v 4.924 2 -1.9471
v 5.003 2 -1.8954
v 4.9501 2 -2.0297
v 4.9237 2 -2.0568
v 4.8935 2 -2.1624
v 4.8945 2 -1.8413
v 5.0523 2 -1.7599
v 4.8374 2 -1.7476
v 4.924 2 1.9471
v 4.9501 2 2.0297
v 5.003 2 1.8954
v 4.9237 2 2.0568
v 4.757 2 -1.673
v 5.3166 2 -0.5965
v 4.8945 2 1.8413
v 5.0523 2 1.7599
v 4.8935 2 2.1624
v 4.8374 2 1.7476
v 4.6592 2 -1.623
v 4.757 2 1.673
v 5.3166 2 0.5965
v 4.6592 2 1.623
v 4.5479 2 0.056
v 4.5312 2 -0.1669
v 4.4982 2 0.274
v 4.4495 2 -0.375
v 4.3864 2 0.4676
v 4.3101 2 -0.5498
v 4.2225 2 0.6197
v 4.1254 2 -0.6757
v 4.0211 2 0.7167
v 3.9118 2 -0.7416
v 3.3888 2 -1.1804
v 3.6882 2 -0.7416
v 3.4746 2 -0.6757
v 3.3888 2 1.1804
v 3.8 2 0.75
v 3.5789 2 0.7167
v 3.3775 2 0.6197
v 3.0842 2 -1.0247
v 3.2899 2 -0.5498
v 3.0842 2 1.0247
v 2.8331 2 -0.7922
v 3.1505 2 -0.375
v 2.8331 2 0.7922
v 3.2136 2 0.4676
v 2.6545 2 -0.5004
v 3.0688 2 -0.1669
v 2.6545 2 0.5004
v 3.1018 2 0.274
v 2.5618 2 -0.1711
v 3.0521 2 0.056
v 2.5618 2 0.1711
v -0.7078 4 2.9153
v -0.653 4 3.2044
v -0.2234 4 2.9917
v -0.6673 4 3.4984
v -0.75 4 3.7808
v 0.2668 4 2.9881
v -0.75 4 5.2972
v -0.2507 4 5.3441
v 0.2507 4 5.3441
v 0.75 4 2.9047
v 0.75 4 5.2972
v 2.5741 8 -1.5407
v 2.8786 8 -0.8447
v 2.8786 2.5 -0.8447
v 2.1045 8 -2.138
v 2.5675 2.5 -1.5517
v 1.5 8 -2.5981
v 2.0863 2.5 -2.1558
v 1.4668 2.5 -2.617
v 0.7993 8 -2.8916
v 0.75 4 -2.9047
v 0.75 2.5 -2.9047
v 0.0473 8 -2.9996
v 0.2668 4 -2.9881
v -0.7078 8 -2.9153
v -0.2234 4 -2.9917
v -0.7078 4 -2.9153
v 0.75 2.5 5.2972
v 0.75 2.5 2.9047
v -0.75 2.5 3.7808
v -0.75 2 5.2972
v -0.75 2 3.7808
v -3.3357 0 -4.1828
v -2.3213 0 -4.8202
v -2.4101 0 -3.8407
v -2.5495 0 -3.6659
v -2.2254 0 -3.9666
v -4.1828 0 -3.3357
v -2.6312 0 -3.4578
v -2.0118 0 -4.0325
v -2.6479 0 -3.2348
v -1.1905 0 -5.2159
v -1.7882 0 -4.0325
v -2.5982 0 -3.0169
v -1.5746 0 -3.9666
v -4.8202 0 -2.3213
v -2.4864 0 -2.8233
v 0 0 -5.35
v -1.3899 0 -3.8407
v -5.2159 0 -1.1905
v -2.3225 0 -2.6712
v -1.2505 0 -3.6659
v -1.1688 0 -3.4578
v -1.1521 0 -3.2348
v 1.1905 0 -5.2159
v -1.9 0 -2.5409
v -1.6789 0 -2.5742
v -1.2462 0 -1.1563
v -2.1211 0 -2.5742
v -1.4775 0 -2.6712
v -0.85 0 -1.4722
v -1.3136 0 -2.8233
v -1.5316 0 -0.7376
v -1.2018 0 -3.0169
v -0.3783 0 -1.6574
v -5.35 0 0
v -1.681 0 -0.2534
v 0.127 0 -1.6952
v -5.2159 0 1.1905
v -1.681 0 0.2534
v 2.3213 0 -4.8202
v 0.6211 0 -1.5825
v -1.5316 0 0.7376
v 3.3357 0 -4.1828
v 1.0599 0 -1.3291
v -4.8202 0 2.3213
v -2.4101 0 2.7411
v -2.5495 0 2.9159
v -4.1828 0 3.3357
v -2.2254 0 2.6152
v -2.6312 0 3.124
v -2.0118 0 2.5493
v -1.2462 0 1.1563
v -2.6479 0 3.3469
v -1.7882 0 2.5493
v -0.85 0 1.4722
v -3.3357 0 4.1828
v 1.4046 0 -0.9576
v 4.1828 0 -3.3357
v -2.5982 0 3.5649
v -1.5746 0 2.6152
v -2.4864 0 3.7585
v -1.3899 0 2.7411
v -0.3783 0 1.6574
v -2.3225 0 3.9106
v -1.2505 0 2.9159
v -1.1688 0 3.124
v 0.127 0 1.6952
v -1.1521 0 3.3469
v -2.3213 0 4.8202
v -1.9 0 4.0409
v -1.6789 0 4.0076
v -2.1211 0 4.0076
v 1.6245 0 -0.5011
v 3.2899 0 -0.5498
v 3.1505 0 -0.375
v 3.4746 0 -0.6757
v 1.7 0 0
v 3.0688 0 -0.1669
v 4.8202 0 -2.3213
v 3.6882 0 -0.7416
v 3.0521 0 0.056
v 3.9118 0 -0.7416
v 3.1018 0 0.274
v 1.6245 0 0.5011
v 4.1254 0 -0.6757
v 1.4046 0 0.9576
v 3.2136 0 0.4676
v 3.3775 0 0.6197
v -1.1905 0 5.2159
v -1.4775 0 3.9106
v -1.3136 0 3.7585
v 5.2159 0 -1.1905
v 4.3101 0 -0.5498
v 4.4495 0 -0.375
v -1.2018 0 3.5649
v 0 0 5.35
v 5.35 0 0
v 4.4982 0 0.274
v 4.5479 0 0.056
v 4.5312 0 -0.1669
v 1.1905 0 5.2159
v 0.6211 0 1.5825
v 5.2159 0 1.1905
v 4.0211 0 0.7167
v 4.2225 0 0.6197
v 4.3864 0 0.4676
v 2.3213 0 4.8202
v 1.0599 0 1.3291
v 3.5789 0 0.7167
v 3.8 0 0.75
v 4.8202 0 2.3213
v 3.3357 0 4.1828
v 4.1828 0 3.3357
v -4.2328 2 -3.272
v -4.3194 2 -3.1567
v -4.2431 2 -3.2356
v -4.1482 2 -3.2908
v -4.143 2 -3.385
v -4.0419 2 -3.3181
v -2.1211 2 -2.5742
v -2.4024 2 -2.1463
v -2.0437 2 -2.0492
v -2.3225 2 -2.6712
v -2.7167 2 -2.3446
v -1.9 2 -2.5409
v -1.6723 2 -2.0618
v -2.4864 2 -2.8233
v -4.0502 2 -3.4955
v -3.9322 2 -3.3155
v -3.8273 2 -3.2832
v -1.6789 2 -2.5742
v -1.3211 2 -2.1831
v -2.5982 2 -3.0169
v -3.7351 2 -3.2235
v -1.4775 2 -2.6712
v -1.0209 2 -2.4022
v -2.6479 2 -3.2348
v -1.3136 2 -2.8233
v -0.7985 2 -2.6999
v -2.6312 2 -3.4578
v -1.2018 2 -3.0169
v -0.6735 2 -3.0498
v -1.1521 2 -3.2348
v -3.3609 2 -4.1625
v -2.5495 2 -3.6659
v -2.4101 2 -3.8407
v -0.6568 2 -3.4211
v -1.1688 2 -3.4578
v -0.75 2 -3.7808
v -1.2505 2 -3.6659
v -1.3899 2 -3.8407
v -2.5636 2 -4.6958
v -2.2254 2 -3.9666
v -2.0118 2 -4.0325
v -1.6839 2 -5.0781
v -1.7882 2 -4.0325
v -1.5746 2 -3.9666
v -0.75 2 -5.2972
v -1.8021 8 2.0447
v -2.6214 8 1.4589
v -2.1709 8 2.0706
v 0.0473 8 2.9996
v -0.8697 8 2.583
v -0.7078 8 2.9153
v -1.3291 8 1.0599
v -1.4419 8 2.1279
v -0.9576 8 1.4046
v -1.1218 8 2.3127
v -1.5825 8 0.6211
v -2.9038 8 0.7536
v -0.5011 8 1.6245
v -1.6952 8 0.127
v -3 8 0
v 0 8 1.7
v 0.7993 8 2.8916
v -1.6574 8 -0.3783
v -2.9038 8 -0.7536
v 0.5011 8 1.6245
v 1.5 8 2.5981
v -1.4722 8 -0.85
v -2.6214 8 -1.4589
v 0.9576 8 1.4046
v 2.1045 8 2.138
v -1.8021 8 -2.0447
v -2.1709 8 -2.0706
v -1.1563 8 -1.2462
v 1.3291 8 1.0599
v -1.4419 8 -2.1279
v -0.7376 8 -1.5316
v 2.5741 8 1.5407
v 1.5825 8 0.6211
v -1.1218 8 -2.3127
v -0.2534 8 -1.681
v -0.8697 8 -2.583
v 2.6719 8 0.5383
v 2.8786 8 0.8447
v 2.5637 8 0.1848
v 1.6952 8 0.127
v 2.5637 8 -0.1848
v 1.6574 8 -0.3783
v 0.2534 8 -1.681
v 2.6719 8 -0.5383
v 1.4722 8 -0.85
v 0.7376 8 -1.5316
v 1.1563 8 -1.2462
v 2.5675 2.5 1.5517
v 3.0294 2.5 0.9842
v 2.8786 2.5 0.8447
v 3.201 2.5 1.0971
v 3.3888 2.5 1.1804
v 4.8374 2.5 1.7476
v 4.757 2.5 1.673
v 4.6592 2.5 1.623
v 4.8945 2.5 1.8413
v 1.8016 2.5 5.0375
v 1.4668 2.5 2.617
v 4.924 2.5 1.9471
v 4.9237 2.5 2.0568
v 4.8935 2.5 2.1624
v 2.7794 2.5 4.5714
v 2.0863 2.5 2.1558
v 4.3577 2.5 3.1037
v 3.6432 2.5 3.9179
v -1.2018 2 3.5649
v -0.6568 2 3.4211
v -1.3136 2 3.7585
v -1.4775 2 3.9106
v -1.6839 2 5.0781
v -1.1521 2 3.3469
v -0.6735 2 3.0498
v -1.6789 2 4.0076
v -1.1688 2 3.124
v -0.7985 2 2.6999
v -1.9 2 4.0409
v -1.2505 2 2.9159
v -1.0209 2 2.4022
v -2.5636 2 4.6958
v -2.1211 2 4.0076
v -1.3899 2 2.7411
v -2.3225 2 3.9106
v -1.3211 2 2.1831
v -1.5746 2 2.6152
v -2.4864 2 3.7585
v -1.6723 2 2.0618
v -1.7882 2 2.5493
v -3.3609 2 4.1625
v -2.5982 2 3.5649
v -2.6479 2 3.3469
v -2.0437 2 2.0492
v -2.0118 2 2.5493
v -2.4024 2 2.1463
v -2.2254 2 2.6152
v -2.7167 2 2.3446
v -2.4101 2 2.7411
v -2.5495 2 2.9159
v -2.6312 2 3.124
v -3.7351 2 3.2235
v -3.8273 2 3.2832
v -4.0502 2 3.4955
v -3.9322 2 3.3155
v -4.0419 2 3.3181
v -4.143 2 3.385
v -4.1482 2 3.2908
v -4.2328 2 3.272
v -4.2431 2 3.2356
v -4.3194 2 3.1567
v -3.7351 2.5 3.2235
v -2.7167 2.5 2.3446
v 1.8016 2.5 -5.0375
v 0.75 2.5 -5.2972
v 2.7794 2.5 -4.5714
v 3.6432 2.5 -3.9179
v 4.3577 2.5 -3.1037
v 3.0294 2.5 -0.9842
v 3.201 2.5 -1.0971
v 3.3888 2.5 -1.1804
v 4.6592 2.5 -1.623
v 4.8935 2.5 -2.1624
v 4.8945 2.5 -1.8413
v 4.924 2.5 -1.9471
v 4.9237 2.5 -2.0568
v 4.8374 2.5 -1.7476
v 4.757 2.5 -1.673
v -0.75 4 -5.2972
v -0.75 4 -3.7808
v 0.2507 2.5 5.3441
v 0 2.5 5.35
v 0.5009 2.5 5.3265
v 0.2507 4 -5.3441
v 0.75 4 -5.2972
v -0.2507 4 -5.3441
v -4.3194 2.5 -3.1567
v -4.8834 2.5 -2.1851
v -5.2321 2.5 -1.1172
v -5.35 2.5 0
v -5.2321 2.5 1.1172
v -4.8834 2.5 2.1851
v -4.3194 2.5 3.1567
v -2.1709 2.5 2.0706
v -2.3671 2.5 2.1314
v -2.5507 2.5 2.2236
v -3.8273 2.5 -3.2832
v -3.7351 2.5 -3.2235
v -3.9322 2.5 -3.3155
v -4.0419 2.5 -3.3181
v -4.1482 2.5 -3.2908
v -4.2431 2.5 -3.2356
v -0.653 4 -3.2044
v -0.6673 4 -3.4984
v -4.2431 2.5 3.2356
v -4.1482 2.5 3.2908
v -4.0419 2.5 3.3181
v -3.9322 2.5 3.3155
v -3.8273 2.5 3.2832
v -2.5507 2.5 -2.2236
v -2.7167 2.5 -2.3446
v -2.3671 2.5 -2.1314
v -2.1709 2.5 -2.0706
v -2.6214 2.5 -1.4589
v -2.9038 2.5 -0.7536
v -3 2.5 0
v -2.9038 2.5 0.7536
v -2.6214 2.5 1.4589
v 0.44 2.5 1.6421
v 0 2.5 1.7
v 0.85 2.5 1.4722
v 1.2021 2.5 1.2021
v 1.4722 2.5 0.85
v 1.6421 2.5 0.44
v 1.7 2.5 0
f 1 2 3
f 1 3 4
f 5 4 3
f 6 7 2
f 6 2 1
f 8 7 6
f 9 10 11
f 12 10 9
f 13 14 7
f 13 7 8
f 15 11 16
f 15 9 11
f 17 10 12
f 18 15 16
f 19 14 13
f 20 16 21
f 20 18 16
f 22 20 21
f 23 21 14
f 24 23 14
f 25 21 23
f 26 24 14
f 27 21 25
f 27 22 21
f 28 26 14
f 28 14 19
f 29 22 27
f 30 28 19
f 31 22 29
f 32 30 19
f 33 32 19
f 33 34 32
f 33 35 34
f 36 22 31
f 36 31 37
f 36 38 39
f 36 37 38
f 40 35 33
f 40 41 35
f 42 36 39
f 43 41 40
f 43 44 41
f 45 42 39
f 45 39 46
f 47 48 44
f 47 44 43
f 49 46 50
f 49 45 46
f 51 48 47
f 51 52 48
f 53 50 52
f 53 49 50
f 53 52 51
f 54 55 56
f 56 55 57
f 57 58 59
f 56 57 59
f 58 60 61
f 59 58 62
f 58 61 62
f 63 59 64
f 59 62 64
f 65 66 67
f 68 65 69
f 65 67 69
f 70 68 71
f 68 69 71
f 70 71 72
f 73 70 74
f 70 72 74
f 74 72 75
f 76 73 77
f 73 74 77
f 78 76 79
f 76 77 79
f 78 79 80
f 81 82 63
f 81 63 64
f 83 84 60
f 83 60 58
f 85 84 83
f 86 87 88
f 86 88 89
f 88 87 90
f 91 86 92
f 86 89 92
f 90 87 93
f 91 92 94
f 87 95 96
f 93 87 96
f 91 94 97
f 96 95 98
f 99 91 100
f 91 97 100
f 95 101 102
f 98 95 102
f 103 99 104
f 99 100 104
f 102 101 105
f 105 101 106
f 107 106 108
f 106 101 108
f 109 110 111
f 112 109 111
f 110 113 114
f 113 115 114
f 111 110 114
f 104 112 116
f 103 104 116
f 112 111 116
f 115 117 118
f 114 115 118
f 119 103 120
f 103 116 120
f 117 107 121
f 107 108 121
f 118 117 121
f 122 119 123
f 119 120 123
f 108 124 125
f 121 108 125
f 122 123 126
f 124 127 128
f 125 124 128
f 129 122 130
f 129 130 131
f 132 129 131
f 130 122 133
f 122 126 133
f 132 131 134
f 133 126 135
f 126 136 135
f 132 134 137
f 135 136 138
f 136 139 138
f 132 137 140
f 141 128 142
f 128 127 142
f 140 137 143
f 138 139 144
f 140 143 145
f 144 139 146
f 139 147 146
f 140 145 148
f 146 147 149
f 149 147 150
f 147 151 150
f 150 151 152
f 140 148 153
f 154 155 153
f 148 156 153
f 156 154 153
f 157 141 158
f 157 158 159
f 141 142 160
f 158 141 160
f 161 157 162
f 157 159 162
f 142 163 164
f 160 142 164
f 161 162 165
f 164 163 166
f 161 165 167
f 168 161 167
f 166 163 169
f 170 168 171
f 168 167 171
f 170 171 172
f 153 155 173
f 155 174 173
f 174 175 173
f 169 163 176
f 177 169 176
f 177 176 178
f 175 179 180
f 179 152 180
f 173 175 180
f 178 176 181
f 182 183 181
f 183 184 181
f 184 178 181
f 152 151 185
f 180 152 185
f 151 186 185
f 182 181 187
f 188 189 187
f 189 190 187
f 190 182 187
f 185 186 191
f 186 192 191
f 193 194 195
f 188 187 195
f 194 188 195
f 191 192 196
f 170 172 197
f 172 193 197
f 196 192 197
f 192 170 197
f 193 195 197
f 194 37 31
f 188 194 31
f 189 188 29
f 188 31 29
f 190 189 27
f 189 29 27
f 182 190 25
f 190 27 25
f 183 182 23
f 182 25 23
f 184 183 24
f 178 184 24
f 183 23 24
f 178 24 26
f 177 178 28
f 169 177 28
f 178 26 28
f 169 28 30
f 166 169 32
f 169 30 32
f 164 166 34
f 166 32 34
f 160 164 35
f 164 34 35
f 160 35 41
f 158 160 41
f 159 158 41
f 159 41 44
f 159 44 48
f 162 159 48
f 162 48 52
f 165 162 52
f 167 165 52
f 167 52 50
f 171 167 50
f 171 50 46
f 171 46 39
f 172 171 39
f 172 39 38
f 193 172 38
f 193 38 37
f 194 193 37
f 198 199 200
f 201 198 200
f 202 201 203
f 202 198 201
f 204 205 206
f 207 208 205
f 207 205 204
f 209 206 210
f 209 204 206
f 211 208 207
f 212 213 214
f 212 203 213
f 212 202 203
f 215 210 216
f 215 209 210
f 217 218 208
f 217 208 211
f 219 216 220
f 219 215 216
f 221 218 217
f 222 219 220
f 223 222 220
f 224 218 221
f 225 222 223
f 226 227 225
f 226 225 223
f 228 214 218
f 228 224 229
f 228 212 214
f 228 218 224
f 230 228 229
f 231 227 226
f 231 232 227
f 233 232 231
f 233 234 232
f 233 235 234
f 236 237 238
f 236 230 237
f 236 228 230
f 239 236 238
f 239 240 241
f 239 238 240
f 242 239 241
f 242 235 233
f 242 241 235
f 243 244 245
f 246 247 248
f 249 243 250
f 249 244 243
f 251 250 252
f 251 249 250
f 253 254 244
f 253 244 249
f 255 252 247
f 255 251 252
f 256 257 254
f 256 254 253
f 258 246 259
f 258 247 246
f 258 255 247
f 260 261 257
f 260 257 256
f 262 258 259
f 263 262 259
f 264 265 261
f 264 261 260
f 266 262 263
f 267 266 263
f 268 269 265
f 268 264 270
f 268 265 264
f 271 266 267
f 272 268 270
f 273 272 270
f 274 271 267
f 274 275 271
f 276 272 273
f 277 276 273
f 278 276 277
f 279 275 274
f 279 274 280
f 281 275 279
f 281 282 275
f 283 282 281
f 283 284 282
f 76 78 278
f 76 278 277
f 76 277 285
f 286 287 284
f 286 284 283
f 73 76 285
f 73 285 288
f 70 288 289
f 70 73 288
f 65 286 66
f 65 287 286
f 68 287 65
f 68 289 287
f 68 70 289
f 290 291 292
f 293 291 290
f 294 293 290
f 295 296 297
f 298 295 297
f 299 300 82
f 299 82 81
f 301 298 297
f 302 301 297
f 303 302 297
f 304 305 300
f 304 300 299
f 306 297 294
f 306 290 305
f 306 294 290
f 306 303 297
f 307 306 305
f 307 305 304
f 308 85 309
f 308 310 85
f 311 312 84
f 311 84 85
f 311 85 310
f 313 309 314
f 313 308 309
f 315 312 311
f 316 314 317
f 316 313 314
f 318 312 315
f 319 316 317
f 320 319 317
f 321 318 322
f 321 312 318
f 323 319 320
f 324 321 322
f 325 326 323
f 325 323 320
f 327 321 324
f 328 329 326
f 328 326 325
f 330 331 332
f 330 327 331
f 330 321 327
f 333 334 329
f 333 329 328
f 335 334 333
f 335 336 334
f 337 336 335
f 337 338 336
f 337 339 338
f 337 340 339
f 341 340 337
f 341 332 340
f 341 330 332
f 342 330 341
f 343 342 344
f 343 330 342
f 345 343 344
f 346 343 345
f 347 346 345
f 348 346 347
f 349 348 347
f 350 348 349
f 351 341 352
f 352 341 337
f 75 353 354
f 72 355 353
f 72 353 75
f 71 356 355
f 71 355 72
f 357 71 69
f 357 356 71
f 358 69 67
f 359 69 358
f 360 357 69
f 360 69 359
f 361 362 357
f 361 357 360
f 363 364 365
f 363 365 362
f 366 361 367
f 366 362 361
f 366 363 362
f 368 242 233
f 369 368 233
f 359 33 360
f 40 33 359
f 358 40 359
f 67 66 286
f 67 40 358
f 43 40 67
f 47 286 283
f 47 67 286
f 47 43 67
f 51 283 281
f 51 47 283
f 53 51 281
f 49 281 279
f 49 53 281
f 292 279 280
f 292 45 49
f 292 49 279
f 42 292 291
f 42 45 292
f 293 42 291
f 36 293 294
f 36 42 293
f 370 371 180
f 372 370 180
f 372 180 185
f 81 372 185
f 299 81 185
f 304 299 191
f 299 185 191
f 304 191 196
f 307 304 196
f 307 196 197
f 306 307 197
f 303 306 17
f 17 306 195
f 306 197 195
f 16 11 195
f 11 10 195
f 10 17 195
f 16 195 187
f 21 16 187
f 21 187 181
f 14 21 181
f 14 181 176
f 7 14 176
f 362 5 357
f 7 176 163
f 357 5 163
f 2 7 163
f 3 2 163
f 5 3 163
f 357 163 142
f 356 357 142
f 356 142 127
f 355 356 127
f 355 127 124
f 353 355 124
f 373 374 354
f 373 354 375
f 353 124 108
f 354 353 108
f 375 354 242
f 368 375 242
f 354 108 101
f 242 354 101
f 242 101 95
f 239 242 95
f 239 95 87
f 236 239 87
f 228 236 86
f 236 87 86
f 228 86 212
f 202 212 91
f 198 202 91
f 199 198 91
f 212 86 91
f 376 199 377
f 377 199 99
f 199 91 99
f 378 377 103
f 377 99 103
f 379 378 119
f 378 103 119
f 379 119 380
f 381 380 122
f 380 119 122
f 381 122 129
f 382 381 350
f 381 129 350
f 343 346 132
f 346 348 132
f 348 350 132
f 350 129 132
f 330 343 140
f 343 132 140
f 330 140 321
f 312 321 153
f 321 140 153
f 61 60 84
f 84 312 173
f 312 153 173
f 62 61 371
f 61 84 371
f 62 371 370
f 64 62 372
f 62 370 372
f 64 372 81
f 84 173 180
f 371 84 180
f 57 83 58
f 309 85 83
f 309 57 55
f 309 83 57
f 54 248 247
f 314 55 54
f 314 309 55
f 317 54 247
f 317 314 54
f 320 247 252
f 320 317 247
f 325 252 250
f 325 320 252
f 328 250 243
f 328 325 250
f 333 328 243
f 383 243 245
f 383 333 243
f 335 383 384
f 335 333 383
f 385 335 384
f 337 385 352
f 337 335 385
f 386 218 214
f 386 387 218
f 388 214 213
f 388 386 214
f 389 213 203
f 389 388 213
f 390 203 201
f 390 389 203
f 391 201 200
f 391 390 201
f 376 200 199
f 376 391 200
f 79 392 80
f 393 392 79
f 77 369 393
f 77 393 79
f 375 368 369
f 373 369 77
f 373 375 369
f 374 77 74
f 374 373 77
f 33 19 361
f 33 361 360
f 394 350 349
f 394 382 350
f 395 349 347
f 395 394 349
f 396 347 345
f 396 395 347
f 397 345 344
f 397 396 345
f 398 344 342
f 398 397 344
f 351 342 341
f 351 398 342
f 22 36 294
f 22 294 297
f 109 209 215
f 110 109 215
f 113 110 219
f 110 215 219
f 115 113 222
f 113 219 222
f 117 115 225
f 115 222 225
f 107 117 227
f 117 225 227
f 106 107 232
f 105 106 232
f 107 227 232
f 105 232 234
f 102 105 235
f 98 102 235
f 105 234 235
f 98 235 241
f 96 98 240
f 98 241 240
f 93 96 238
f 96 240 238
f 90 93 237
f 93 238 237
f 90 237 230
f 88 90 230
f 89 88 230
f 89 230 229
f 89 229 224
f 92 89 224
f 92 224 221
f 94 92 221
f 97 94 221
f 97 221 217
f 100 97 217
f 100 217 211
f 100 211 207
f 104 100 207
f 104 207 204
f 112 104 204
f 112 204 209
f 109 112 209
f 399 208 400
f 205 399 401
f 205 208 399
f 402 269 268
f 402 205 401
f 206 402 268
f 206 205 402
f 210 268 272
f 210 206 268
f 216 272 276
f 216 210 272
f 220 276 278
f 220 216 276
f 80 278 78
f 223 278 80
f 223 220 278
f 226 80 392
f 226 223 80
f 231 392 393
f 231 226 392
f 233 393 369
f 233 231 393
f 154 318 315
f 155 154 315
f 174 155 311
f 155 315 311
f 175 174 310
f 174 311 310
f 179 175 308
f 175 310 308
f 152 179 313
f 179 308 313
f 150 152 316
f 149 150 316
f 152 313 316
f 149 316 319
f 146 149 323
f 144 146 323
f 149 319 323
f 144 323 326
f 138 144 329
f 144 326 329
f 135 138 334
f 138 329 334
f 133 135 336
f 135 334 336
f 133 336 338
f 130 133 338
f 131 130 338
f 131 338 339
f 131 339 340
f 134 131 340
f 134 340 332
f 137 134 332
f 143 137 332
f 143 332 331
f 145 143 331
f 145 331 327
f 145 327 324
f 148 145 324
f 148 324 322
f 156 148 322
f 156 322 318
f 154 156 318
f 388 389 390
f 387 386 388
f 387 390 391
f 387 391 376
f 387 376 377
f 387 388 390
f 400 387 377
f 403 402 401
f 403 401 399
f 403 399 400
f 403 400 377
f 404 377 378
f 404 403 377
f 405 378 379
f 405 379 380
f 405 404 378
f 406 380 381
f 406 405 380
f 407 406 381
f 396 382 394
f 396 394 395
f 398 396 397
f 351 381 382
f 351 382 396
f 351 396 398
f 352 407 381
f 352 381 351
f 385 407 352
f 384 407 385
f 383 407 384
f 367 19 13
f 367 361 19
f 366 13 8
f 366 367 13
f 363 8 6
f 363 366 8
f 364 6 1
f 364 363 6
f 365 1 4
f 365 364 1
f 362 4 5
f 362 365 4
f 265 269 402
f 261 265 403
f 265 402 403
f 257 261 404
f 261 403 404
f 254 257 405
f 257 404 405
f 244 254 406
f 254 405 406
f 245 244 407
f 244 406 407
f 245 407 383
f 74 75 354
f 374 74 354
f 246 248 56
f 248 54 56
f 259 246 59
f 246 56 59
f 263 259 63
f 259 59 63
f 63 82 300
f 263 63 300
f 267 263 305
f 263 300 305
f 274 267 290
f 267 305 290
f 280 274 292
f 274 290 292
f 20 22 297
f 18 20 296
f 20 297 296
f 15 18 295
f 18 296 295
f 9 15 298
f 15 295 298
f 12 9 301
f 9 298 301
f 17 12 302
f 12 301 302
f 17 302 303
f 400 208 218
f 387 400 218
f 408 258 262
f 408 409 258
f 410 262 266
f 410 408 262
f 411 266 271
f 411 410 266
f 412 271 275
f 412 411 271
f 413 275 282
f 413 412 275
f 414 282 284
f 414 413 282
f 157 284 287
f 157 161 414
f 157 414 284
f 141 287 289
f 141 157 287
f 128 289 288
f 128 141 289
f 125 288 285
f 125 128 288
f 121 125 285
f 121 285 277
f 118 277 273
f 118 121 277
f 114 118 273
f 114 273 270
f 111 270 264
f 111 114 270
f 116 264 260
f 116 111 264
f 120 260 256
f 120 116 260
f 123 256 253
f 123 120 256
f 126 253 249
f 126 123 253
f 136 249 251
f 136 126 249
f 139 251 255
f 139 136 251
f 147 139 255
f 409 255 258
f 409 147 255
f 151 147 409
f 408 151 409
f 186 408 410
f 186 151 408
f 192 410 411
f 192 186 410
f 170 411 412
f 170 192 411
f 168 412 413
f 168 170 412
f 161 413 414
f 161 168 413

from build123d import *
from build123d.topology import SkipClean

# Parameters (mm, degrees)
SKETCH1_R           = 5.35
BOSS_EXTRUDE1_DEPTH = 2.5
HOLE1_OUTLINE_R     = 1.7
HOLE1_DEPTH         = 2.5
SKETCH3_R           = 3
SKETCH3_R_2         = 1.7
BOSS_EXTRUDE2_DEPTH = 10
FILLET1_R           = 0.1
BOSS_EXTRUDE3_DEPTH = 1.5
SKETCH8_R           = 0.75
CUT_EXTRUDE1_DEPTH  = 13.539736839
CUT_EXTRUDE3_START  = -0.5
SKETCH13_R          = 1.25
CUT_EXTRUDE3_DEPTH  = 7
CHAMFER1_SIZE       = 0.25
CUT_EXTRUDE4_START  = -0.5
CUT_EXTRUDE4_DEPTH  = 0.5
FILLET2_R           = 0.4
CUT_EXTRUDE5_START  = -4.5
SKETCH15_R          = 3
CUT_EXTRUDE5_DEPTH  = 4.5


# Read off the part's stored shape, not the designer's step: Hole1
with BuildPart() as part:
    # Sketch1 → Boss-Extrude1 (new body)
    with BuildSketch(Plane(origin=(0, 0, 0), x_dir=(1, 0, 0), z_dir=(0, 1, 0))):
        with Locations(Location((0, 0, 0), (0, 0, 270))):
            Circle(SKETCH1_R)
    extrude(amount=BOSS_EXTRUDE1_DEPTH)

    # Hole1 outline → Hole1 (cut)
    with BuildSketch(Plane(origin=(0, 0, 0), x_dir=(1, 0, 0), z_dir=(0, 1, 0))):
        Circle(HOLE1_OUTLINE_R)
    extrude(amount=HOLE1_DEPTH, mode=Mode.SUBTRACT)

    # Sketch3 → Boss-Extrude2 (add)
    with BuildSketch(Plane(origin=(0, 2.5, 0), x_dir=(1, 0, 0), z_dir=(0, 1, 0))):
        with Locations(Location((0, 0, 0), (0, 0, 270))):
            Circle(SKETCH3_R)
        with Locations(Location((0, 0, 0), (0, 0, 270))):
            Circle(SKETCH3_R_2, mode=Mode.SUBTRACT)
    extrude(amount=BOSS_EXTRUDE2_DEPTH)

    # Fillet1
    fillet1_edges = [part.edges().sort_by_distance(p)[0] for p in [
        (0, 12.5, -3),
    ]]
    fillet(fillet1_edges, radius=FILLET1_R)

    # Sketch5 → Boss-Extrude3 (add)
    with BuildSketch(Plane(origin=(0, 2.5, 0), x_dir=(1, 0, 0), z_dir=(0, 1, 0))):
        with BuildLine():
            Line((-0.75, 5.297169055), (-0.75, 2.90473751))
            ThreePointArc((-0.75, 2.90473751), (0, 3), (0.75, 2.90473751))
            Line((0.75, 2.90473751), (0.75, 5.297169055))
            ThreePointArc((0.75, 5.297169055), (0, 5.35), (-0.75, 5.297169055))
        make_face()
    boss_extrude3 = extrude(amount=BOSS_EXTRUDE3_DEPTH)

    # Mirror1: Boss-Extrude3 across plane
    with SkipClean():  # the faces are left unmerged after this step: merging them gives an invalid solid
        add(boss_extrude3.mirror(Plane.XY))

    # Sketch8 → Cut-Extrude1 (cut, through all)
    with SkipClean():  # the faces are left unmerged after this step: merging them gives an invalid solid
        with BuildSketch(Plane(origin=(0, 2.5, 0), x_dir=(1, 0, 0), z_dir=(0, 1, 0))):
            with Locations(Location((3.8, 0, 0), (0, 0, 270))):
                Circle(SKETCH8_R)
            with Locations(Location((-1.9, -3.290896534, 0), (0, 0, 270))):
                Circle(SKETCH8_R)
            with Locations(Location((-1.9, 3.290896534, 0), (0, 0, 270))):
                Circle(SKETCH8_R)
        extrude(amount=-CUT_EXTRUDE1_DEPTH, mode=Mode.SUBTRACT)

    # Sketch13 → Cut-Extrude3 (cut)
    with SkipClean():  # the faces are left unmerged after this step: merging them gives an invalid solid
        with BuildSketch(Plane(origin=(0, 2.5, 0), x_dir=(1, 0, 0), z_dir=(0, 1, 0)).offset(CUT_EXTRUDE3_START)):
            with Locations(Location((-1.9, 3.290896534, 0), (0, 0, 23.073918066))):
                Circle(SKETCH13_R)
            with Locations(Location((-1.9, -3.290896534, 0), (0, 0, 102.514591278))):
                Circle(SKETCH13_R)
            with Locations(Location((3.8, 0, 0), (0, 0, 137.485408722))):
                Circle(SKETCH13_R)
        extrude(amount=CUT_EXTRUDE3_DEPTH, mode=Mode.SUBTRACT)

    # Chamfer1
    chamfer1_edges = [part.edges().sort_by_distance(p)[0] for p in [
        (-1.275, 9, -2.20836478),
        (-1.275, 9, 2.20836478),
        (2.55, 9, 0),
    ]]
    chamfer(chamfer1_edges, length=CHAMFER1_SIZE)

    # Sketch14 → Cut-Extrude4 (cut)
    with BuildSketch(Plane(origin=(0, 2.5, 0), x_dir=(1, 0, 0), z_dir=(0, 1, 0)).offset(CUT_EXTRUDE4_START)):
        with BuildLine():
            Line((-0.75, -3.780794483), (-0.75, -5.297169055))
            ThreePointArc((-0.75, -5.297169055), (-2.563606422, -4.695787699), (-4.050222345, -3.495454041))
            Line((-4.050222345, -3.495454041), (-2.716694869, -2.344582902))
            ThreePointArc((-2.716694869, -2.344582902), (-2.637189937, -4.300377092), (-0.75, -3.780794483))
        make_face()
        with BuildLine():
            Line((-0.75, 5.297169055), (-0.75, 3.780794483))
            ThreePointArc((-0.75, 3.780794483), (-2.637189937, 4.300377092), (-2.716694869, 2.344582902))
            Line((-2.716694869, 2.344582902), (-4.050222345, 3.495454041))
            ThreePointArc((-4.050222345, 3.495454041), (-2.563606422, 4.695787699), (-0.75, 5.297169055))
        make_face()
        with BuildLine():
            Line((3.388815789, -1.18043532), (5.05226317, -1.759868421))
            ThreePointArc((5.05226317, -1.759868421), (5.35, 0), (5.05226317, 1.759868421))
            Line((5.05226317, 1.759868421), (3.388815789, 1.18043532))
            ThreePointArc((3.388815789, 1.18043532), (5.05, 0), (3.388815789, -1.18043532))
        make_face()
    extrude(amount=CUT_EXTRUDE4_DEPTH, mode=Mode.SUBTRACT)

    # Fillet2
    fillet2_edges = [part.edges().sort_by_distance(p)[0] for p in [
        (-4.050222345, 2.25, -3.495454041),
        (-4.050222345, 2.25, 3.495454041),
        (5.05226317, 2.25, -1.759868421),
        (5.05226317, 2.25, 1.759868421),
    ]]
    fillet(fillet2_edges, radius=FILLET2_R)

    # Sketch15 → Cut-Extrude5 (cut)
    with BuildSketch(Plane(origin=(0, 12.5, 0), x_dir=(1, 0, 0), z_dir=(0, 1, 0)).offset(CUT_EXTRUDE5_START)):
        Circle(SKETCH15_R)
    extrude(amount=CUT_EXTRUDE5_DEPTH, mode=Mode.SUBTRACT)


solid = part.part
